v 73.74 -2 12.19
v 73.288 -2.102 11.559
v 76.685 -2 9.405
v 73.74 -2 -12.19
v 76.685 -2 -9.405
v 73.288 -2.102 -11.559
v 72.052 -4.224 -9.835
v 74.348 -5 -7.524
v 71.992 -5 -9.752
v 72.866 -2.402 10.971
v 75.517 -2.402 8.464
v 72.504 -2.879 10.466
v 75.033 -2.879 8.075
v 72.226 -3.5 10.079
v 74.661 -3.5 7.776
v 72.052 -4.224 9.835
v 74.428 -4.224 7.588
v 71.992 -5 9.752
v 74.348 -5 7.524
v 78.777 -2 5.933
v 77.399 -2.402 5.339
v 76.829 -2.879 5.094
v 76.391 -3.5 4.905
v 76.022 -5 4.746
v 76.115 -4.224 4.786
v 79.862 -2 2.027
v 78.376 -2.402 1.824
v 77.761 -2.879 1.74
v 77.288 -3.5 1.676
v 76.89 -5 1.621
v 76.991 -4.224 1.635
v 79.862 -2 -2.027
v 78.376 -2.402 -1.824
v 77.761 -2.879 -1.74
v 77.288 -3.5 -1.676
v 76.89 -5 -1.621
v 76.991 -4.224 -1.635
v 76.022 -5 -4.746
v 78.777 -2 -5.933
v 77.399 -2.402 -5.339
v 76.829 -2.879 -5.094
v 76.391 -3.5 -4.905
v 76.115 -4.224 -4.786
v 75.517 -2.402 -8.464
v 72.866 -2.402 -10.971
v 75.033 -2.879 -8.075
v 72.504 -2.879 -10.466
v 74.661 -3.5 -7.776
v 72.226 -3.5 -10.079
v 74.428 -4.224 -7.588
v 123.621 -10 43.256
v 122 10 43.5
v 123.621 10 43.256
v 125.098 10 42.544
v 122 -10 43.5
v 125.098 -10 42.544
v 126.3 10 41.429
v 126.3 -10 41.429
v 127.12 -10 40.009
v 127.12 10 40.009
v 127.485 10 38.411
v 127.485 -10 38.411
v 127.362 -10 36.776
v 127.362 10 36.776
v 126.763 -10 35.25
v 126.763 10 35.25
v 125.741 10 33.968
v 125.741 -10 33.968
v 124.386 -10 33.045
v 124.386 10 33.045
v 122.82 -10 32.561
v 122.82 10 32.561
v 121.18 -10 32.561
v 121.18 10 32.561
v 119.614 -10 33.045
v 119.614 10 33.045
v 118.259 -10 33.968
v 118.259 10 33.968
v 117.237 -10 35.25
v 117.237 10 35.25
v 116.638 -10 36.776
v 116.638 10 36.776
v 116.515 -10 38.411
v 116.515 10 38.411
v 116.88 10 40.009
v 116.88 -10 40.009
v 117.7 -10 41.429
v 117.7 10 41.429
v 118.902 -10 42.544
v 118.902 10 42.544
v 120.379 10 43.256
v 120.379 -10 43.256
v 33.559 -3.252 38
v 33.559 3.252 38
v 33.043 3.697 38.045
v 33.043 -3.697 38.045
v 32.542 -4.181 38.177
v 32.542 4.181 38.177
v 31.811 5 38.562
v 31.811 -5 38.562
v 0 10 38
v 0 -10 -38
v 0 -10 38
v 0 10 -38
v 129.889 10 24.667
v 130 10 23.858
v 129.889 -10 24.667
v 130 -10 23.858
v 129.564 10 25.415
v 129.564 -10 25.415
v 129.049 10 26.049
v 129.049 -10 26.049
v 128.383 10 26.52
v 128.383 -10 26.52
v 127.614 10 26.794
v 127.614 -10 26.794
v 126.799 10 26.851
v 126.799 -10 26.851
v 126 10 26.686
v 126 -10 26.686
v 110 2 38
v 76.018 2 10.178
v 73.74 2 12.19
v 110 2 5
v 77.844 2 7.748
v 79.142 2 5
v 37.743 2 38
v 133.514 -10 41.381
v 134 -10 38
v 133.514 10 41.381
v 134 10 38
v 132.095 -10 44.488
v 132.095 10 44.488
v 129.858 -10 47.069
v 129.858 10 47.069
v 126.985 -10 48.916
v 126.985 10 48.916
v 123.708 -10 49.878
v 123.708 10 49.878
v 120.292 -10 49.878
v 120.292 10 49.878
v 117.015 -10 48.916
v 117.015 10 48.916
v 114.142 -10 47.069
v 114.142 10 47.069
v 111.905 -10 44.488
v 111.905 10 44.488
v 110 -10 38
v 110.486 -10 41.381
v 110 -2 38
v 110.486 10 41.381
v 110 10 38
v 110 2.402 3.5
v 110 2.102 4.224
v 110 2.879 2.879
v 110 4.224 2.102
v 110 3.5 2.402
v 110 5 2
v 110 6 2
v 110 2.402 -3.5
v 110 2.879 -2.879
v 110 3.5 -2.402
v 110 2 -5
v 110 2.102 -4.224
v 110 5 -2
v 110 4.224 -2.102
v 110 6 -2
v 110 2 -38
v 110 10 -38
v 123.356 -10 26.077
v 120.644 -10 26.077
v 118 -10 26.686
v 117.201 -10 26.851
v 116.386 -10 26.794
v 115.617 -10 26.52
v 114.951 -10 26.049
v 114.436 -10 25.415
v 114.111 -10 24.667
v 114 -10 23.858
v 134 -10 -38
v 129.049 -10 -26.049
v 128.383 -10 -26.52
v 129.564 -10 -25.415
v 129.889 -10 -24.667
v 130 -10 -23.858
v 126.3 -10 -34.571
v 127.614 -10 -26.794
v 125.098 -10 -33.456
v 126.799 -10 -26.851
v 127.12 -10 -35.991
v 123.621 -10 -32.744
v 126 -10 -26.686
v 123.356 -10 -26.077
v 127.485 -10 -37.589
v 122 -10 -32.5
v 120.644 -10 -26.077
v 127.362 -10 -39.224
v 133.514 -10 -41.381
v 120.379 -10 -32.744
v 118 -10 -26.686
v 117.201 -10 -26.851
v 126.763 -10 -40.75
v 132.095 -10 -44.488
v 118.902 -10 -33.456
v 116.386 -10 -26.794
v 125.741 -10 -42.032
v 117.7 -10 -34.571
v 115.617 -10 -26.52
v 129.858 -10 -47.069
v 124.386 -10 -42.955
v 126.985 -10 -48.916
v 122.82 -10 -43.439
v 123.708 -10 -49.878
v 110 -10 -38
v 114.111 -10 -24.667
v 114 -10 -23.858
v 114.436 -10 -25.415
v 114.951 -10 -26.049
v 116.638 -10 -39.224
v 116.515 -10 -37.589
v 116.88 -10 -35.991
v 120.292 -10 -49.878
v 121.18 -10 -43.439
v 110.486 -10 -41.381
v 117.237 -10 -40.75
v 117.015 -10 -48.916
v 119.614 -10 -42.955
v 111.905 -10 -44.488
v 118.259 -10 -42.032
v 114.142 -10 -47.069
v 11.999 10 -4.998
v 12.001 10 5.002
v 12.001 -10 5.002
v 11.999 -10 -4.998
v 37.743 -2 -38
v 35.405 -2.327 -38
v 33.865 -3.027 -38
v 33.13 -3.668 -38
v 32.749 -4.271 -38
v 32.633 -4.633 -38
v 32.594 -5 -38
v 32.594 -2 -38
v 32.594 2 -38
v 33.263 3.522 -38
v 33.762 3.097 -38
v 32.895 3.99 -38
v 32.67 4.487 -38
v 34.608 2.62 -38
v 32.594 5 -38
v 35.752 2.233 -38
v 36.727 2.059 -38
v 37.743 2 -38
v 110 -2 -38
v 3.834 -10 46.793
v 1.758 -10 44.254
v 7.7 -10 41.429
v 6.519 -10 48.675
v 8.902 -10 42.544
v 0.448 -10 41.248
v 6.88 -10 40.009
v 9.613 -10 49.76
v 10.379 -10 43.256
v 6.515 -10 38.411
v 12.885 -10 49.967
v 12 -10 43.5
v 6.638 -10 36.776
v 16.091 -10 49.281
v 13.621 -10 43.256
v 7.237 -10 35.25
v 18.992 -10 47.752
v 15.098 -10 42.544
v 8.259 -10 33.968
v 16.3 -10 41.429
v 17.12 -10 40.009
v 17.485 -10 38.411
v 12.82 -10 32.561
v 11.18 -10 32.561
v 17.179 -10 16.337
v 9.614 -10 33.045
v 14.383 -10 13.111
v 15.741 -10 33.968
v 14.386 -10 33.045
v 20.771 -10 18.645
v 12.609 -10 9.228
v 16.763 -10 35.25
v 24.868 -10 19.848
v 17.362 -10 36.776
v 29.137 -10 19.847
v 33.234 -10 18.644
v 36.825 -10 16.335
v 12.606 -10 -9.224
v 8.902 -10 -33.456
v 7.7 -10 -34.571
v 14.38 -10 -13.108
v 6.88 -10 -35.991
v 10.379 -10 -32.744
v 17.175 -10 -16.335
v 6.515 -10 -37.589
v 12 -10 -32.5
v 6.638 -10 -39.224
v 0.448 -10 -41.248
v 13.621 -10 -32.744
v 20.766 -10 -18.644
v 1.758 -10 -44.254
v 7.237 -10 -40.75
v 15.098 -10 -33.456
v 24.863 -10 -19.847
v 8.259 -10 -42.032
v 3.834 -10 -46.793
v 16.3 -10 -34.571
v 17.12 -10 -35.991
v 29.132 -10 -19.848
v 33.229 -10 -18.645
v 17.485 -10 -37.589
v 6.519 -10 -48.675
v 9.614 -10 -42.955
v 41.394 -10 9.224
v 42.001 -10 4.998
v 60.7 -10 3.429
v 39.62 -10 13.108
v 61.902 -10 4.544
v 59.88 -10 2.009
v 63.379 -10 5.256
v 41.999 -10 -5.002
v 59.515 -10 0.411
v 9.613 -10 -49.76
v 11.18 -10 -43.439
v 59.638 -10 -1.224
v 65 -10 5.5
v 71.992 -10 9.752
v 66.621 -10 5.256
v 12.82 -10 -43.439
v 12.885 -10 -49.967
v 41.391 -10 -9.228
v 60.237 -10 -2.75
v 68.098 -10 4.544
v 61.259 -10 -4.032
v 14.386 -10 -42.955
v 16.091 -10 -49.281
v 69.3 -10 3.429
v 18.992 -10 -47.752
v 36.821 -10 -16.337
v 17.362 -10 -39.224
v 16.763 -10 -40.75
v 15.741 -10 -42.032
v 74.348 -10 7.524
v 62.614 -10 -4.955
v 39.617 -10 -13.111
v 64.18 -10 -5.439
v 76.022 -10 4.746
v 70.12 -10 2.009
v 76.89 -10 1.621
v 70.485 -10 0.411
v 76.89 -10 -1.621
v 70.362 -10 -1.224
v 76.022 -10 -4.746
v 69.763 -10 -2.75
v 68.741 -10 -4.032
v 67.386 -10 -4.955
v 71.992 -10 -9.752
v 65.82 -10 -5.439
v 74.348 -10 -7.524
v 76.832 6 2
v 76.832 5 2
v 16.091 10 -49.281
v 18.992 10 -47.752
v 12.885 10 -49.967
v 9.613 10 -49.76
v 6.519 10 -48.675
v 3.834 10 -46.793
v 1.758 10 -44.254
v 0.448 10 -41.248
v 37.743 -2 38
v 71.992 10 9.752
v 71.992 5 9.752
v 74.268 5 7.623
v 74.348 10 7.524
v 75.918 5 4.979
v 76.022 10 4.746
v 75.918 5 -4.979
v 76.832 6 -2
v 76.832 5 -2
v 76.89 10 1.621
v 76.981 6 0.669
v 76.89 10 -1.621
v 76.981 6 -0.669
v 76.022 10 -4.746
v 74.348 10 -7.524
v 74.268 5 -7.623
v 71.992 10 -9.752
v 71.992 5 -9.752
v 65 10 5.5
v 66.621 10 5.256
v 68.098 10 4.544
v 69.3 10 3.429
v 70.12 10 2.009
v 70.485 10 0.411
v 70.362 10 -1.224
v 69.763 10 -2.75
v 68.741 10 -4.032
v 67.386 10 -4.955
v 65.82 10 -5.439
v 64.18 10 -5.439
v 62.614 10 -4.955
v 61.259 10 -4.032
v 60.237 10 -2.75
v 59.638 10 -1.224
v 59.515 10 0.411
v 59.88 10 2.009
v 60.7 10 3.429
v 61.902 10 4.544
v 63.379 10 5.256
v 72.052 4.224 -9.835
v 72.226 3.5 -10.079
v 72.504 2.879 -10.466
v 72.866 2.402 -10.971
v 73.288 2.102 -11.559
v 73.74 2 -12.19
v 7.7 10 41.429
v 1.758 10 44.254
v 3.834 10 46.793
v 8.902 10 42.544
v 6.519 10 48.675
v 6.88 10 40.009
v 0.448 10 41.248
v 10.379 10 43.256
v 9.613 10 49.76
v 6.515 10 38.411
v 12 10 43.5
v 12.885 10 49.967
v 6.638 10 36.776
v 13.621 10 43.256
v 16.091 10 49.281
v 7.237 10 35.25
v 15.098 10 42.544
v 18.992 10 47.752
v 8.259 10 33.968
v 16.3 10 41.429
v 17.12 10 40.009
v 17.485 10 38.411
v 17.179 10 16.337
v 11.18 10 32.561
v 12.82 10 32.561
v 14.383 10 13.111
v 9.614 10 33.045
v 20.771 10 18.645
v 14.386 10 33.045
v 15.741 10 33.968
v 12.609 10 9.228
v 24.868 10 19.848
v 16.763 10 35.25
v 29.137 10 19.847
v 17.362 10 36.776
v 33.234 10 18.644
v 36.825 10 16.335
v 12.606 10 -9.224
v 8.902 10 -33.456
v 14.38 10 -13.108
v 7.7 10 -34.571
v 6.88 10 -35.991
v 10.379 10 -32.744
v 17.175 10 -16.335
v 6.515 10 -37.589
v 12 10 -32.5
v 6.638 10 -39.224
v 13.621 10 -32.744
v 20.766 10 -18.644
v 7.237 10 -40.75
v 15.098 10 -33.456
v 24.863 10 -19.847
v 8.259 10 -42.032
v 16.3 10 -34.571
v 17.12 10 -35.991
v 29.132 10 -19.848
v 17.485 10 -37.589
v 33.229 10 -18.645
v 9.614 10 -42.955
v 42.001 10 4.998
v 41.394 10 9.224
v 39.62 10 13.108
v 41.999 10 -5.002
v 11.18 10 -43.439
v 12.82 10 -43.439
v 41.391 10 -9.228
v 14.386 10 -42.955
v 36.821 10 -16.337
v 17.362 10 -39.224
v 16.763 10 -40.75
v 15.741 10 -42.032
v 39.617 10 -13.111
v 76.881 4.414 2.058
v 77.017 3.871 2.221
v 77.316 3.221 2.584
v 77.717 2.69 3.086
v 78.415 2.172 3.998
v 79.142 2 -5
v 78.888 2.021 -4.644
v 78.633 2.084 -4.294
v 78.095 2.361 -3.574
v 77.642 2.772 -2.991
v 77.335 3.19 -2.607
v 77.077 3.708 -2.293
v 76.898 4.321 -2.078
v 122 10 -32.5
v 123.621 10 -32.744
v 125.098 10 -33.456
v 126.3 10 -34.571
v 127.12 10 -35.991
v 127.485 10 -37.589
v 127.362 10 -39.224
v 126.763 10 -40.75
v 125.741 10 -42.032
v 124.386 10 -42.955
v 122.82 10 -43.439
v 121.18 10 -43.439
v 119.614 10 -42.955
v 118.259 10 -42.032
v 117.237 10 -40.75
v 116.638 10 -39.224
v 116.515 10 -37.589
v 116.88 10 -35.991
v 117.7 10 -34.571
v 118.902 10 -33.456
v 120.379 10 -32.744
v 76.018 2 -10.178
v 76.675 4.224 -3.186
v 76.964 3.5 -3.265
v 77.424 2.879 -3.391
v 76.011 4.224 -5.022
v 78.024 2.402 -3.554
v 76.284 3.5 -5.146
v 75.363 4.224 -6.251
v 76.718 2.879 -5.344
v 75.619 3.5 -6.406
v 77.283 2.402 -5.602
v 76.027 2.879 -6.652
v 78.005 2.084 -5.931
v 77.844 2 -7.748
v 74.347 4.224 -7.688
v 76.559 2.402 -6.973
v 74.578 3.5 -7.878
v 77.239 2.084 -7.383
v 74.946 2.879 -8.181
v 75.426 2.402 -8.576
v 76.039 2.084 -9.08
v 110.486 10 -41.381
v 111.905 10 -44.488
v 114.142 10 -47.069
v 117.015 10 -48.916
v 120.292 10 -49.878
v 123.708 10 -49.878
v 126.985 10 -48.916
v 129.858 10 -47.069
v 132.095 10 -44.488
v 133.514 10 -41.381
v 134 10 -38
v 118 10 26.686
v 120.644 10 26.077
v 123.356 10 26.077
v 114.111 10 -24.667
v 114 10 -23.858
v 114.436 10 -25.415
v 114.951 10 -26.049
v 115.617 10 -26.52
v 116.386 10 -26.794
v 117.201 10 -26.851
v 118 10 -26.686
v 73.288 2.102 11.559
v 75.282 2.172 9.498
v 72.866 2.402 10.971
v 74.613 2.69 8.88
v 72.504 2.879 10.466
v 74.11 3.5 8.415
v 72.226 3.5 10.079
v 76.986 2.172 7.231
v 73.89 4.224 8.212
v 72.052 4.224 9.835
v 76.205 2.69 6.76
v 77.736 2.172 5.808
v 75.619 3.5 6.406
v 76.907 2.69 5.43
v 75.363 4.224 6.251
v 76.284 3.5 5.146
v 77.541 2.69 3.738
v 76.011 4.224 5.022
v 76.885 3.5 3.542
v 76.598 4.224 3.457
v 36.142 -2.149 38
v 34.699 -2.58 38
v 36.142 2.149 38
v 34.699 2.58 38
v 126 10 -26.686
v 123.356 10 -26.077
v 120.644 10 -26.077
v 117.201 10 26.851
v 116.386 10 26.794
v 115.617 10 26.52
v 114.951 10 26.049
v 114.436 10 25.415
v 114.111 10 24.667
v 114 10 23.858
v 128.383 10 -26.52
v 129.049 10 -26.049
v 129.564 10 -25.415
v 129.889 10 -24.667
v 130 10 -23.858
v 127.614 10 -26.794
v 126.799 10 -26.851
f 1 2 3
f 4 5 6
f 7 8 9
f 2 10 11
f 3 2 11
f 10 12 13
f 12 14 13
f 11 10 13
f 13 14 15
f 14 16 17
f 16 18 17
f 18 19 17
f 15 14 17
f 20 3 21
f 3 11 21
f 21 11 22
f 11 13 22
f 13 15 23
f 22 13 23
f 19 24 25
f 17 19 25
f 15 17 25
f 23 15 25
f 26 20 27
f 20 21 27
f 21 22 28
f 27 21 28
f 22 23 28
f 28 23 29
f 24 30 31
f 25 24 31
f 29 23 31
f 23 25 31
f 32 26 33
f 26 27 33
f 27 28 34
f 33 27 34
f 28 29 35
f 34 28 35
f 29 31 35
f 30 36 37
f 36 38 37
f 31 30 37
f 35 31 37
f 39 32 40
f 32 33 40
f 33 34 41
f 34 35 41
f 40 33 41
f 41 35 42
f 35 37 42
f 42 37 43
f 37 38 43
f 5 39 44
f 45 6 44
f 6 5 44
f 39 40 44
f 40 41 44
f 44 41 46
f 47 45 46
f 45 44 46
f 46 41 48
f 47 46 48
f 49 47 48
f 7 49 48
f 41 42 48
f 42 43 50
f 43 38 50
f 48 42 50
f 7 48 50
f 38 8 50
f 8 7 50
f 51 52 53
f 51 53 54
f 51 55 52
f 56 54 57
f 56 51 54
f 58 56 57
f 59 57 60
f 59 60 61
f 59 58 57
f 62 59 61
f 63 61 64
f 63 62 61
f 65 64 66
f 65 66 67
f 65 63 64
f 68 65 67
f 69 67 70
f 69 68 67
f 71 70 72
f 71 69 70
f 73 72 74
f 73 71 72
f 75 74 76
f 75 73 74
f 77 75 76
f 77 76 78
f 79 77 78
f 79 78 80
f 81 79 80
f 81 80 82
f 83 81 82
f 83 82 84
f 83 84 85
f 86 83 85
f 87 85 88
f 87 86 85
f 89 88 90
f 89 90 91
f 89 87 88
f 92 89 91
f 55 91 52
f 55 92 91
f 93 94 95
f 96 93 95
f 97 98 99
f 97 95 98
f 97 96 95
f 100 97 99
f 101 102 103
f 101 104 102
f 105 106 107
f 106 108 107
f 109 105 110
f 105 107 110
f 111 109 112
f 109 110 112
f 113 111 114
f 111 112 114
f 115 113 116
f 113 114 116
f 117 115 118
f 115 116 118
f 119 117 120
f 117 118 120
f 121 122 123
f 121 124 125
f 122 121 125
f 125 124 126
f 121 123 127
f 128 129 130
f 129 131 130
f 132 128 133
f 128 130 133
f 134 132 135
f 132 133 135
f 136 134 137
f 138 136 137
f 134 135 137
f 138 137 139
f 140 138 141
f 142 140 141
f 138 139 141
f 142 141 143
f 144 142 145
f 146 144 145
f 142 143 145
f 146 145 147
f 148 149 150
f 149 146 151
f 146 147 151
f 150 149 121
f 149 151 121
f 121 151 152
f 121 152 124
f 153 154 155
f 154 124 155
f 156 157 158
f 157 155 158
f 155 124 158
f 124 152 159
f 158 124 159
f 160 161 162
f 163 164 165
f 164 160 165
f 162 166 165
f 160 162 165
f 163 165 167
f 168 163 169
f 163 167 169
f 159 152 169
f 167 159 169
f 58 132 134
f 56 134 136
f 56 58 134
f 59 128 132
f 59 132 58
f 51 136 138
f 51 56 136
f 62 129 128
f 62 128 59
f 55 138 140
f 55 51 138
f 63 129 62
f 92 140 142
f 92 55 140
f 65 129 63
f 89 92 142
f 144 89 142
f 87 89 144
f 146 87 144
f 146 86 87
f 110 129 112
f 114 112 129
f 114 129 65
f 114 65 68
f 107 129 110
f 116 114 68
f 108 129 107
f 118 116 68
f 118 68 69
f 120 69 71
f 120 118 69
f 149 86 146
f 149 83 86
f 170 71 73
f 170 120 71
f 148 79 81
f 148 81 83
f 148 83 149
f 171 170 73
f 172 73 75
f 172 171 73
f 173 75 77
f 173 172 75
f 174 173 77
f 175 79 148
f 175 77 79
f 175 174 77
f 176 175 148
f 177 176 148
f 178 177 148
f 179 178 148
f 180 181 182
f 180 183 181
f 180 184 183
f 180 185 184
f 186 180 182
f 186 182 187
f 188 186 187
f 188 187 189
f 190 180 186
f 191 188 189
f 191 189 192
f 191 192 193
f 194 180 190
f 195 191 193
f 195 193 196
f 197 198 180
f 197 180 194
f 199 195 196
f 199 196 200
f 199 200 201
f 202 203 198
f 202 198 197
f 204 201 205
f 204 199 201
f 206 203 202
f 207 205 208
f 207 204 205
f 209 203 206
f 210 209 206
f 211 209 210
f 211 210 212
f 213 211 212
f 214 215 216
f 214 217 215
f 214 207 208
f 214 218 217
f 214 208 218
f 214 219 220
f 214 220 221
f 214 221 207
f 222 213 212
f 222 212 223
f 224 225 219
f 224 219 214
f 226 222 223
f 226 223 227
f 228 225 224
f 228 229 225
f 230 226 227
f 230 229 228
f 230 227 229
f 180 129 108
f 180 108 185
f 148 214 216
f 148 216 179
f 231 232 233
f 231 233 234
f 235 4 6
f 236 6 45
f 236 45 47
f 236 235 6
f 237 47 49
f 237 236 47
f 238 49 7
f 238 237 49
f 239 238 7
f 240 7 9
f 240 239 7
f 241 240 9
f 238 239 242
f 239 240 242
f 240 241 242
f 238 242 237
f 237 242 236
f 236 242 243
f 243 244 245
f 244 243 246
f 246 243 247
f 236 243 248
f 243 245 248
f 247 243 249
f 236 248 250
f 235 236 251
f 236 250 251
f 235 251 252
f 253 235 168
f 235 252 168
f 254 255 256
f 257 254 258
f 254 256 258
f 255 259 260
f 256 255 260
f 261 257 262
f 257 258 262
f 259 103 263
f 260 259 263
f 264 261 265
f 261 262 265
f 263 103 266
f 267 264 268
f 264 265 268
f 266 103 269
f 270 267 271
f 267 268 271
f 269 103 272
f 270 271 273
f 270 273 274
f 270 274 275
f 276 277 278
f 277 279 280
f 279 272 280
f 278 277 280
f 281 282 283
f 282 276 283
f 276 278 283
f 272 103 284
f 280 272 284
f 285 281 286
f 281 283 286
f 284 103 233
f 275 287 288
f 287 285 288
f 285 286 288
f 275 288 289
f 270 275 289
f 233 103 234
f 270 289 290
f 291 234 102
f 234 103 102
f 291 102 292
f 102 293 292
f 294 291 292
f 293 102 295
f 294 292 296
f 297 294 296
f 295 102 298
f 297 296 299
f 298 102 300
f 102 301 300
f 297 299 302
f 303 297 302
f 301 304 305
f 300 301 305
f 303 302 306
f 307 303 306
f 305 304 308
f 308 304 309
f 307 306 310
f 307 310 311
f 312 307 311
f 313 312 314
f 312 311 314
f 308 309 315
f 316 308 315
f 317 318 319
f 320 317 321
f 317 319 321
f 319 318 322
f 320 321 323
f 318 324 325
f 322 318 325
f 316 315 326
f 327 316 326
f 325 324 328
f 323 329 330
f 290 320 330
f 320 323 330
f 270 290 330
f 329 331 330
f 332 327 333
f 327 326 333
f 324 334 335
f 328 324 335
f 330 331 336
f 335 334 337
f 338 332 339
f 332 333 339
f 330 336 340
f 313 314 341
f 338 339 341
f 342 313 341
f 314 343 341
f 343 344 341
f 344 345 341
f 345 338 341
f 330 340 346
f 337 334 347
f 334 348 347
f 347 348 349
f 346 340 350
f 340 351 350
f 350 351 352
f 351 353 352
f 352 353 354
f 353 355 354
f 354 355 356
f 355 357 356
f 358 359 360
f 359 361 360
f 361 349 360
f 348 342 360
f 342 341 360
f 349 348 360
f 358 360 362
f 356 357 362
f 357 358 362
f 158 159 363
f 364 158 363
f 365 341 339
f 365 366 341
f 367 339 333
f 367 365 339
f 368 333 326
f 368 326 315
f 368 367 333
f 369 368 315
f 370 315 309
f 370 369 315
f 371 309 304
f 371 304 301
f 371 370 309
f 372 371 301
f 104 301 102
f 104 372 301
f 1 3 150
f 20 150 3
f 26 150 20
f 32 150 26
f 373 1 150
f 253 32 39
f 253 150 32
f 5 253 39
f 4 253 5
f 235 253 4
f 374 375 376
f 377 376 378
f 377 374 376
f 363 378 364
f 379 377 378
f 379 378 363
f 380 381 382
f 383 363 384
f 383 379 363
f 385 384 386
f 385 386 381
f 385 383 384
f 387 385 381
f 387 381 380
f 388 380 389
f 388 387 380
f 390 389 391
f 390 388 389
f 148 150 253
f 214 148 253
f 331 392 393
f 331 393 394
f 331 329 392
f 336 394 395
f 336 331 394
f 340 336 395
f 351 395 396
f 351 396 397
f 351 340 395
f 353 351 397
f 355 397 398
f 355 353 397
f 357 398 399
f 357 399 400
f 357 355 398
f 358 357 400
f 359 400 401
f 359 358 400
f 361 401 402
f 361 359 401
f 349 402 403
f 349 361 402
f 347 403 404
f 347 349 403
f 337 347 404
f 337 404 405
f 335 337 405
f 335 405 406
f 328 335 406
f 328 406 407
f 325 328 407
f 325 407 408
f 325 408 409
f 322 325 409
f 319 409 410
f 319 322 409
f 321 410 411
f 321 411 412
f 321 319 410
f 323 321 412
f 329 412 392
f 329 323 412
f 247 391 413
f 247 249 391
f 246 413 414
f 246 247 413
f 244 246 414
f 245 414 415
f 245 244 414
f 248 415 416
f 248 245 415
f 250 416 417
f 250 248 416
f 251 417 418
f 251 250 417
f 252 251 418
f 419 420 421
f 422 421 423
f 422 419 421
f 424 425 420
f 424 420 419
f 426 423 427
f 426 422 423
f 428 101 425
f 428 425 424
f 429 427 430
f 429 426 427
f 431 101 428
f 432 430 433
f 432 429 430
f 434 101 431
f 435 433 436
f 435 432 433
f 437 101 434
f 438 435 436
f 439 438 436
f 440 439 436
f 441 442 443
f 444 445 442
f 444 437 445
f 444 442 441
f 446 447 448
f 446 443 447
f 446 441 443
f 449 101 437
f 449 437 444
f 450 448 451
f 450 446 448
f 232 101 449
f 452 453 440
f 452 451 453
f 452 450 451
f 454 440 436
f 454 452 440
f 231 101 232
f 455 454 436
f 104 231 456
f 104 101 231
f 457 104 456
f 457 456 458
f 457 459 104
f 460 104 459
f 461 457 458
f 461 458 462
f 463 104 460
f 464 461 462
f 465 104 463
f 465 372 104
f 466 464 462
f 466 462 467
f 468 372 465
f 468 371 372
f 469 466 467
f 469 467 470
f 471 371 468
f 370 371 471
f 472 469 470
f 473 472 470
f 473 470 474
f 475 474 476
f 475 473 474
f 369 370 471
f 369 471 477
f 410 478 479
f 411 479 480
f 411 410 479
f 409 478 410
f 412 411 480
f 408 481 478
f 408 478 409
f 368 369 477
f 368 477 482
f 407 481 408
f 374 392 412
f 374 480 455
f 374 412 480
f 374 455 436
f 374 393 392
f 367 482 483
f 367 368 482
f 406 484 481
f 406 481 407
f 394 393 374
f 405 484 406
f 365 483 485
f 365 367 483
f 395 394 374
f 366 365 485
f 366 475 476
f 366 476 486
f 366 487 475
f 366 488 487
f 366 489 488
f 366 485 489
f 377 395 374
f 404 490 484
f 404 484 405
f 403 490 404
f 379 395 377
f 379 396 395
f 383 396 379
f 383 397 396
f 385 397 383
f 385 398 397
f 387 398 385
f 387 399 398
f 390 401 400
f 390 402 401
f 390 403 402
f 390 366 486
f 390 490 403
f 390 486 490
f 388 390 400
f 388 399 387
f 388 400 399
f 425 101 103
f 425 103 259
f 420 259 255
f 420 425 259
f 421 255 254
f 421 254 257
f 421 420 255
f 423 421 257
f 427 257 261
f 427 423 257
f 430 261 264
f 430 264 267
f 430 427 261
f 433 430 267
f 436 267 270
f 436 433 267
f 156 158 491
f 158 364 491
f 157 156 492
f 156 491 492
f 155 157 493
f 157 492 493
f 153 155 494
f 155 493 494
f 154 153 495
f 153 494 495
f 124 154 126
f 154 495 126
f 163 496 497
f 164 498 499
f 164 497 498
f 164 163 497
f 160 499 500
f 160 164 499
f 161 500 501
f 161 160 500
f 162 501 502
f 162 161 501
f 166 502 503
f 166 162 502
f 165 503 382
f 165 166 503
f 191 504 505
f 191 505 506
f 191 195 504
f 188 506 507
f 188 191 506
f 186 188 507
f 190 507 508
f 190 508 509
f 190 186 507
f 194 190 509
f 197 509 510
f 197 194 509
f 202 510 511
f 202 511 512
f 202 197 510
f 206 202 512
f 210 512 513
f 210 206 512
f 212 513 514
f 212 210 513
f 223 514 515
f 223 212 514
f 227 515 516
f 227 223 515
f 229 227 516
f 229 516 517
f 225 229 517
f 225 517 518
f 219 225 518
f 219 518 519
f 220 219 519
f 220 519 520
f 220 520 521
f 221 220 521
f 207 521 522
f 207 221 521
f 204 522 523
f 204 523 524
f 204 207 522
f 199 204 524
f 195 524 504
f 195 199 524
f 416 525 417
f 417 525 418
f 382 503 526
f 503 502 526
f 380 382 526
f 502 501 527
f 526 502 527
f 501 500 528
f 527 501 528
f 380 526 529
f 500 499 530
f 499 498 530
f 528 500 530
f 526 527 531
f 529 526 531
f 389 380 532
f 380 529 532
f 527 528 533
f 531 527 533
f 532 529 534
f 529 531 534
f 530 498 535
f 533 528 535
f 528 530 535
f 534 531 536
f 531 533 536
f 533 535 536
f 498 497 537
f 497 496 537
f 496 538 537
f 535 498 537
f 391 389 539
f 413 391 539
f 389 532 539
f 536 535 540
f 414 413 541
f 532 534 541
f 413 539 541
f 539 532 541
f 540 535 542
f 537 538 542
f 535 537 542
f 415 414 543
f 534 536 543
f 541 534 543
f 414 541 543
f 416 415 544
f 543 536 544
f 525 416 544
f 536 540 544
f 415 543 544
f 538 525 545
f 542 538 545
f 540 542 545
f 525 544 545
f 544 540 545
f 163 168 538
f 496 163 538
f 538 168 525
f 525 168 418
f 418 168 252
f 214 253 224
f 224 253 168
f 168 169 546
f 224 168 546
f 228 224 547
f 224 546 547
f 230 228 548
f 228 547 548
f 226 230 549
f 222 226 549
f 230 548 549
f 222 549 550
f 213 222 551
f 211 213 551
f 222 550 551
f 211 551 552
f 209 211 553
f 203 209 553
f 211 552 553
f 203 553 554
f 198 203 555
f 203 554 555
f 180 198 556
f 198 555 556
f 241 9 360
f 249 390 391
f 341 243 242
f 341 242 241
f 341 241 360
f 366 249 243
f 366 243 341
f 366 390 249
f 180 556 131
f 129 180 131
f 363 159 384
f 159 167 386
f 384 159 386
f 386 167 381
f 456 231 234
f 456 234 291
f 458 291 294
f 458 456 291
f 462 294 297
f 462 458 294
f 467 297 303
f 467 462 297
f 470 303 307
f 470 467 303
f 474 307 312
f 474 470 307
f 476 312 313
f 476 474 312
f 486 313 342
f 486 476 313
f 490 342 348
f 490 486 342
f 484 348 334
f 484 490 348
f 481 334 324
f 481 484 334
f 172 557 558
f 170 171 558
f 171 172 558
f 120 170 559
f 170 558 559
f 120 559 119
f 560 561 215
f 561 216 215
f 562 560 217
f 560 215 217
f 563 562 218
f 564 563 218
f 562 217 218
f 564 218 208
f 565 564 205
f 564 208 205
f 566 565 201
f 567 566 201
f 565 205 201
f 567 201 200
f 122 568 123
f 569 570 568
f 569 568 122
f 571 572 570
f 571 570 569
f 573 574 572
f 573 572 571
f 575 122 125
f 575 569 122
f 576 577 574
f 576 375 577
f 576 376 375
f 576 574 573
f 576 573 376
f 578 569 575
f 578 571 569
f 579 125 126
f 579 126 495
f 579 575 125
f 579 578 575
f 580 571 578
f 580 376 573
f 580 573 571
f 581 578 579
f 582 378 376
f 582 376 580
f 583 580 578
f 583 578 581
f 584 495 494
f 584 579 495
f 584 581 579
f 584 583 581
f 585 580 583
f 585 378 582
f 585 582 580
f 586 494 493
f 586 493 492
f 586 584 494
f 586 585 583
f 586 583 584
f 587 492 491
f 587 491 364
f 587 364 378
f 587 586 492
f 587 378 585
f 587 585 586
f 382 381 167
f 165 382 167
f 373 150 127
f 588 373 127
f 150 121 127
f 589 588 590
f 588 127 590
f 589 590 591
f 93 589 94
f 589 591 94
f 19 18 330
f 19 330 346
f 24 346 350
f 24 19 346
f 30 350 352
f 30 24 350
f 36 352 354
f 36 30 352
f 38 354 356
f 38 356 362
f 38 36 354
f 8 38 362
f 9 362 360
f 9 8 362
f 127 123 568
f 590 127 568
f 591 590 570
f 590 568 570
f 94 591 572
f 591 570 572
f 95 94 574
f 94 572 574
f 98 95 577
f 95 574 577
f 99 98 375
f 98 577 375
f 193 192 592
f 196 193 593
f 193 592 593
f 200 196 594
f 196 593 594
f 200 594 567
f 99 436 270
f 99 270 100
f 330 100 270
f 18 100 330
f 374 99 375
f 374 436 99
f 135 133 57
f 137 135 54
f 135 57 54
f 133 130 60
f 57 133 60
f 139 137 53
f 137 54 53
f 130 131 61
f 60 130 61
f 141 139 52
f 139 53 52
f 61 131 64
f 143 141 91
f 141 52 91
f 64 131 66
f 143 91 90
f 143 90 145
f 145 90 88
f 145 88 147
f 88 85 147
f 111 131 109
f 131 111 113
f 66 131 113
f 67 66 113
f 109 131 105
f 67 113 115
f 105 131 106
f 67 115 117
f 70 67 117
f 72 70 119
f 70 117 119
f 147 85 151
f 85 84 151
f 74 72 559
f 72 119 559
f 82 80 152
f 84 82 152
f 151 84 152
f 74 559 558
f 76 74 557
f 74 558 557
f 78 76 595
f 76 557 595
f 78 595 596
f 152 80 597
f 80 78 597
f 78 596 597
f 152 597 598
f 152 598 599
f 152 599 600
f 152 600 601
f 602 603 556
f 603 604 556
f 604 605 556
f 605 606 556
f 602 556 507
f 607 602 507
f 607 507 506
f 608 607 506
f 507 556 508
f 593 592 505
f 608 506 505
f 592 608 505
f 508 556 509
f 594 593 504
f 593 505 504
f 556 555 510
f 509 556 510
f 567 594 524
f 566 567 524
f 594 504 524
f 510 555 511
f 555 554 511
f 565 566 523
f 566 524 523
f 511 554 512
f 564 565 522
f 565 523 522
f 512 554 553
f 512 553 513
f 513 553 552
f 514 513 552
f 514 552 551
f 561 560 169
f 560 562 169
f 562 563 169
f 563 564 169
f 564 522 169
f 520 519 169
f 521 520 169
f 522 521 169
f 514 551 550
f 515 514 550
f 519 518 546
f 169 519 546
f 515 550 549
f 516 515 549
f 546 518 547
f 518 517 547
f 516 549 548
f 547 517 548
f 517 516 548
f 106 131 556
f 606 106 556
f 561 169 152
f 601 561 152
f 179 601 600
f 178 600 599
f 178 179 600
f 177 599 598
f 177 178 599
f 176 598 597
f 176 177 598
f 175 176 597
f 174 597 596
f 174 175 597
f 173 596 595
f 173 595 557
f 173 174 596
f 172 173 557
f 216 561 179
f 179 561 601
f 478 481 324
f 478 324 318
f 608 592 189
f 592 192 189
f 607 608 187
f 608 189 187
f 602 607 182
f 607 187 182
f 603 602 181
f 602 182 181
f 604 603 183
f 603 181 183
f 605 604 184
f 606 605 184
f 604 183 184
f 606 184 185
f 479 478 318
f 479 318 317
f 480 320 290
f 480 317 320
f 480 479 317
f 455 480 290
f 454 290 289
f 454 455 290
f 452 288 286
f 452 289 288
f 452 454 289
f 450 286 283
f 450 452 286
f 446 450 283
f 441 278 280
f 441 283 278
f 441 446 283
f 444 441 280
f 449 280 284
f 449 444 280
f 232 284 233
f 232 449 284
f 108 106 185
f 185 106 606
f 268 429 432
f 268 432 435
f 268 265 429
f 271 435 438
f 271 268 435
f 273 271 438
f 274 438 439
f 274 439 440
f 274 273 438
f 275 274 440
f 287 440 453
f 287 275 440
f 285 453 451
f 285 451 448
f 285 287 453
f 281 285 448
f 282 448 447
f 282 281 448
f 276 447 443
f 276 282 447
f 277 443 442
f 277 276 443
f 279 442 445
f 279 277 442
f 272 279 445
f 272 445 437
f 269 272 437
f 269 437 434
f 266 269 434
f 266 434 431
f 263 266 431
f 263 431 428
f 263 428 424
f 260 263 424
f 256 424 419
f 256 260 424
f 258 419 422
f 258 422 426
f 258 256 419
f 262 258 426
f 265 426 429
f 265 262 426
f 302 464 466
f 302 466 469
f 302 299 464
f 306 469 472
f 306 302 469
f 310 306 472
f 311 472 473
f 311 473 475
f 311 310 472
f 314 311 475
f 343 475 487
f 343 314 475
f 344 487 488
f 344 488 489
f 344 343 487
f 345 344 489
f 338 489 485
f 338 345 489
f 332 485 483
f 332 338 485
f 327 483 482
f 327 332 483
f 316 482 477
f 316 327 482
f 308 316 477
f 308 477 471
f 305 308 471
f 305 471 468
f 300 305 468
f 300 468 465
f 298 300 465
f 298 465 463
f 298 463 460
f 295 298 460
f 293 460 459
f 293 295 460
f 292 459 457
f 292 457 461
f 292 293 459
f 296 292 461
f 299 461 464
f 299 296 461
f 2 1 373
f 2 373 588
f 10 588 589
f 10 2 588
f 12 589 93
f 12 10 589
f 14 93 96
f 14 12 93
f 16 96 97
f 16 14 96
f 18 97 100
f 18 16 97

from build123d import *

# Parameters (mm, degrees)
SKETCH1_R             = 5.5
BOSS_EXTRUDE1_DEPTH   = 10
BOSS_EXTRUDE1_2_DEPTH = 10
BOSS_EXTRUDE2_DEPTH   = 2
BOSS_EXTRUDE3_START   = 4
BOSS_EXTRUDE3_DEPTH   = 4
CUT_EXTRUDE1_DEPTH    = 145.416065588
FILLET1_R             = 3
FILLET2_R             = 3
CUT_EXTRUDE2_DEPTH    = 145.416065588


with BuildPart() as part:
    # Sketch1 → Boss-Extrude1 (new, symmetric)
    with BuildSketch(Plane(origin=(0, 0, 0), x_dir=(1, 0, 0), z_dir=(0, 1, 0))):
        with BuildLine():
            Line((0, 38), (0, -38))
            ThreePointArc((0, -38), (6.518533014, -48.67490139), (18.99225328, -47.752353258))
            Line((18.99225328, -47.752353258), (71.99225328, -9.752353258))
            ThreePointArc((71.99225328, -9.752353258), (77, 0), (71.99225328, 9.752353258))
            Line((71.99225328, 9.752353258), (18.99225328, 47.752353258))
            ThreePointArc((18.99225328, 47.752353258), (6.518533014, 48.67490139), (0, 38))
        make_face()
        with Locations(Location((12, 38, 0), (0, 0, 270))):
            Circle(SKETCH1_R, mode=Mode.SUBTRACT)
        with Locations(Location((12, -38, 0), (0, 0, 270))):
            Circle(SKETCH1_R, mode=Mode.SUBTRACT)
        with Locations(Location((65, 0, 0), (0, 0, 270))):
            Circle(SKETCH1_R, mode=Mode.SUBTRACT)
    extrude(amount=BOSS_EXTRUDE1_DEPTH, both=True)



with BuildPart() as body_2:
    # Sketch1 → Boss-Extrude1 2 (new, symmetric)
    with BuildSketch(Plane(origin=(0, 0, 0), x_dir=(1, 0, 0), z_dir=(0, 1, 0))):
        with BuildLine():
            Line((134, 38), (134, -38))
            ThreePointArc((134, -38), (122, -50), (110, -38))
            Line((110, -38), (110, 38))
            ThreePointArc((110, 38), (122, 50), (134, 38))
        make_face()
        with Locations(Location((122, 38, 0), (0, 0, 270))):
            Circle(SKETCH1_R, mode=Mode.SUBTRACT)
        with Locations(Location((122, -38, 0), (0, 0, 270))):
            Circle(SKETCH1_R, mode=Mode.SUBTRACT)
    extrude(amount=BOSS_EXTRUDE1_2_DEPTH, both=True)


with BuildPart() as part_1:
    add(part.part)

    add(body_2.part)  # Boss-Extrude2 merges body 2
    # Sketch2 → Boss-Extrude2 (add, symmetric)
    with BuildSketch(Plane(origin=(0, 0, 0), x_dir=(1, 0, 0), z_dir=(0, 1, 0))):
        with BuildLine():
            Line((110, 38), (110, -38))
            Line((110, -38), (32.594219666, -38))
            Line((32.594219666, -38), (71.99225328, -9.752353258))
            ThreePointArc((71.99225328, -9.752353258), (77, 0), (71.99225328, 9.752353258))
            Line((71.99225328, 9.752353258), (32.594219666, 38))
            Line((32.594219666, 38), (110, 38))
        make_face()
    extrude(amount=BOSS_EXTRUDE2_DEPTH, both=True)

    # Sketch3 → Boss-Extrude3 (add)
    with BuildSketch(Plane(origin=(0, 2, 0), x_dir=(1, 0, 0), z_dir=(0, 1, 0)).offset(BOSS_EXTRUDE3_START)):
        with BuildLine():
            Line((76.832159566, 2), (110, 2))
            Line((110, 2), (110, -2))
            Line((110, -2), (76.832159566, -2))
            ThreePointArc((76.832159566, -2), (77, 0), (76.832159566, 2))
        make_face()
    extrude(amount=-BOSS_EXTRUDE3_DEPTH)

    # Sketch4 → Cut-Extrude1 (cut, through all)
    with BuildSketch(Plane(origin=(0, 10, 0), x_dir=(1, 0, 0), z_dir=(0, 1, 0))):
        with BuildLine():
            Line((114, 29.05572809), (114, -29.05572809))
            ThreePointArc((114, -29.05572809), (122, -26), (130, -29.05572809))
            Line((130, -29.05572809), (130, 29.05572809))
            ThreePointArc((130, 29.05572809), (122, 26), (114, 29.05572809))
        make_face()
    extrude(amount=-CUT_EXTRUDE1_DEPTH, mode=Mode.SUBTRACT)

    # Fillet1
    fillet1_edges = [part_1.edges().sort_by_distance(p)[0] for p in [
        (114, 0, -29.05572809),
        (130, 0, -29.05572809),
        (130, 0, 29.05572809),
        (114, 0, 29.05572809),
    ]]
    fillet(fillet1_edges, radius=FILLET1_R)

    # Fillet2
    fillet2_edges = [part_1.edges().sort_by_distance(p)[0] for p in [
        (52.293236473, -2, -23.876176629),
        (77, -2, 0),
        (52.293236473, -2, 23.876176629),
        (32.594219666, 0, 38),
        (52.293236473, 2, -23.876176629),
        (75.179114648, 2, -6.354968528),
        (52.293236473, 2, 23.876176629),
        (75.179114648, 2, 6.354968528),
        (93.416079783, 2, 2),
        (93.416079783, 2, -2),
    ]]
    fillet(fillet2_edges, radius=FILLET2_R)

    # Sketch5 → Cut-Extrude2 (cut, through all)
    with BuildSketch(Plane(origin=(0, 10, 0), x_dir=(1, 0, 0), z_dir=(0, 1, 0))):
        with BuildLine():
            Line((41.999381369, 5.001855509), (42.000618401, -4.998144414))
            ThreePointArc((42.000618401, -4.998144414), (27.002474063, -19.999999847), (12.000618631, -5.001855509))
            Line((12.000618631, -5.001855509), (11.999381599, 4.998144414))
            ThreePointArc((11.999381599, 4.998144414), (26.997525937, 19.999999847), (41.999381369, 5.001855509))
        make_face()
    extrude(amount=-CUT_EXTRUDE2_DEPTH, mode=Mode.SUBTRACT)


solid = part_1.part
